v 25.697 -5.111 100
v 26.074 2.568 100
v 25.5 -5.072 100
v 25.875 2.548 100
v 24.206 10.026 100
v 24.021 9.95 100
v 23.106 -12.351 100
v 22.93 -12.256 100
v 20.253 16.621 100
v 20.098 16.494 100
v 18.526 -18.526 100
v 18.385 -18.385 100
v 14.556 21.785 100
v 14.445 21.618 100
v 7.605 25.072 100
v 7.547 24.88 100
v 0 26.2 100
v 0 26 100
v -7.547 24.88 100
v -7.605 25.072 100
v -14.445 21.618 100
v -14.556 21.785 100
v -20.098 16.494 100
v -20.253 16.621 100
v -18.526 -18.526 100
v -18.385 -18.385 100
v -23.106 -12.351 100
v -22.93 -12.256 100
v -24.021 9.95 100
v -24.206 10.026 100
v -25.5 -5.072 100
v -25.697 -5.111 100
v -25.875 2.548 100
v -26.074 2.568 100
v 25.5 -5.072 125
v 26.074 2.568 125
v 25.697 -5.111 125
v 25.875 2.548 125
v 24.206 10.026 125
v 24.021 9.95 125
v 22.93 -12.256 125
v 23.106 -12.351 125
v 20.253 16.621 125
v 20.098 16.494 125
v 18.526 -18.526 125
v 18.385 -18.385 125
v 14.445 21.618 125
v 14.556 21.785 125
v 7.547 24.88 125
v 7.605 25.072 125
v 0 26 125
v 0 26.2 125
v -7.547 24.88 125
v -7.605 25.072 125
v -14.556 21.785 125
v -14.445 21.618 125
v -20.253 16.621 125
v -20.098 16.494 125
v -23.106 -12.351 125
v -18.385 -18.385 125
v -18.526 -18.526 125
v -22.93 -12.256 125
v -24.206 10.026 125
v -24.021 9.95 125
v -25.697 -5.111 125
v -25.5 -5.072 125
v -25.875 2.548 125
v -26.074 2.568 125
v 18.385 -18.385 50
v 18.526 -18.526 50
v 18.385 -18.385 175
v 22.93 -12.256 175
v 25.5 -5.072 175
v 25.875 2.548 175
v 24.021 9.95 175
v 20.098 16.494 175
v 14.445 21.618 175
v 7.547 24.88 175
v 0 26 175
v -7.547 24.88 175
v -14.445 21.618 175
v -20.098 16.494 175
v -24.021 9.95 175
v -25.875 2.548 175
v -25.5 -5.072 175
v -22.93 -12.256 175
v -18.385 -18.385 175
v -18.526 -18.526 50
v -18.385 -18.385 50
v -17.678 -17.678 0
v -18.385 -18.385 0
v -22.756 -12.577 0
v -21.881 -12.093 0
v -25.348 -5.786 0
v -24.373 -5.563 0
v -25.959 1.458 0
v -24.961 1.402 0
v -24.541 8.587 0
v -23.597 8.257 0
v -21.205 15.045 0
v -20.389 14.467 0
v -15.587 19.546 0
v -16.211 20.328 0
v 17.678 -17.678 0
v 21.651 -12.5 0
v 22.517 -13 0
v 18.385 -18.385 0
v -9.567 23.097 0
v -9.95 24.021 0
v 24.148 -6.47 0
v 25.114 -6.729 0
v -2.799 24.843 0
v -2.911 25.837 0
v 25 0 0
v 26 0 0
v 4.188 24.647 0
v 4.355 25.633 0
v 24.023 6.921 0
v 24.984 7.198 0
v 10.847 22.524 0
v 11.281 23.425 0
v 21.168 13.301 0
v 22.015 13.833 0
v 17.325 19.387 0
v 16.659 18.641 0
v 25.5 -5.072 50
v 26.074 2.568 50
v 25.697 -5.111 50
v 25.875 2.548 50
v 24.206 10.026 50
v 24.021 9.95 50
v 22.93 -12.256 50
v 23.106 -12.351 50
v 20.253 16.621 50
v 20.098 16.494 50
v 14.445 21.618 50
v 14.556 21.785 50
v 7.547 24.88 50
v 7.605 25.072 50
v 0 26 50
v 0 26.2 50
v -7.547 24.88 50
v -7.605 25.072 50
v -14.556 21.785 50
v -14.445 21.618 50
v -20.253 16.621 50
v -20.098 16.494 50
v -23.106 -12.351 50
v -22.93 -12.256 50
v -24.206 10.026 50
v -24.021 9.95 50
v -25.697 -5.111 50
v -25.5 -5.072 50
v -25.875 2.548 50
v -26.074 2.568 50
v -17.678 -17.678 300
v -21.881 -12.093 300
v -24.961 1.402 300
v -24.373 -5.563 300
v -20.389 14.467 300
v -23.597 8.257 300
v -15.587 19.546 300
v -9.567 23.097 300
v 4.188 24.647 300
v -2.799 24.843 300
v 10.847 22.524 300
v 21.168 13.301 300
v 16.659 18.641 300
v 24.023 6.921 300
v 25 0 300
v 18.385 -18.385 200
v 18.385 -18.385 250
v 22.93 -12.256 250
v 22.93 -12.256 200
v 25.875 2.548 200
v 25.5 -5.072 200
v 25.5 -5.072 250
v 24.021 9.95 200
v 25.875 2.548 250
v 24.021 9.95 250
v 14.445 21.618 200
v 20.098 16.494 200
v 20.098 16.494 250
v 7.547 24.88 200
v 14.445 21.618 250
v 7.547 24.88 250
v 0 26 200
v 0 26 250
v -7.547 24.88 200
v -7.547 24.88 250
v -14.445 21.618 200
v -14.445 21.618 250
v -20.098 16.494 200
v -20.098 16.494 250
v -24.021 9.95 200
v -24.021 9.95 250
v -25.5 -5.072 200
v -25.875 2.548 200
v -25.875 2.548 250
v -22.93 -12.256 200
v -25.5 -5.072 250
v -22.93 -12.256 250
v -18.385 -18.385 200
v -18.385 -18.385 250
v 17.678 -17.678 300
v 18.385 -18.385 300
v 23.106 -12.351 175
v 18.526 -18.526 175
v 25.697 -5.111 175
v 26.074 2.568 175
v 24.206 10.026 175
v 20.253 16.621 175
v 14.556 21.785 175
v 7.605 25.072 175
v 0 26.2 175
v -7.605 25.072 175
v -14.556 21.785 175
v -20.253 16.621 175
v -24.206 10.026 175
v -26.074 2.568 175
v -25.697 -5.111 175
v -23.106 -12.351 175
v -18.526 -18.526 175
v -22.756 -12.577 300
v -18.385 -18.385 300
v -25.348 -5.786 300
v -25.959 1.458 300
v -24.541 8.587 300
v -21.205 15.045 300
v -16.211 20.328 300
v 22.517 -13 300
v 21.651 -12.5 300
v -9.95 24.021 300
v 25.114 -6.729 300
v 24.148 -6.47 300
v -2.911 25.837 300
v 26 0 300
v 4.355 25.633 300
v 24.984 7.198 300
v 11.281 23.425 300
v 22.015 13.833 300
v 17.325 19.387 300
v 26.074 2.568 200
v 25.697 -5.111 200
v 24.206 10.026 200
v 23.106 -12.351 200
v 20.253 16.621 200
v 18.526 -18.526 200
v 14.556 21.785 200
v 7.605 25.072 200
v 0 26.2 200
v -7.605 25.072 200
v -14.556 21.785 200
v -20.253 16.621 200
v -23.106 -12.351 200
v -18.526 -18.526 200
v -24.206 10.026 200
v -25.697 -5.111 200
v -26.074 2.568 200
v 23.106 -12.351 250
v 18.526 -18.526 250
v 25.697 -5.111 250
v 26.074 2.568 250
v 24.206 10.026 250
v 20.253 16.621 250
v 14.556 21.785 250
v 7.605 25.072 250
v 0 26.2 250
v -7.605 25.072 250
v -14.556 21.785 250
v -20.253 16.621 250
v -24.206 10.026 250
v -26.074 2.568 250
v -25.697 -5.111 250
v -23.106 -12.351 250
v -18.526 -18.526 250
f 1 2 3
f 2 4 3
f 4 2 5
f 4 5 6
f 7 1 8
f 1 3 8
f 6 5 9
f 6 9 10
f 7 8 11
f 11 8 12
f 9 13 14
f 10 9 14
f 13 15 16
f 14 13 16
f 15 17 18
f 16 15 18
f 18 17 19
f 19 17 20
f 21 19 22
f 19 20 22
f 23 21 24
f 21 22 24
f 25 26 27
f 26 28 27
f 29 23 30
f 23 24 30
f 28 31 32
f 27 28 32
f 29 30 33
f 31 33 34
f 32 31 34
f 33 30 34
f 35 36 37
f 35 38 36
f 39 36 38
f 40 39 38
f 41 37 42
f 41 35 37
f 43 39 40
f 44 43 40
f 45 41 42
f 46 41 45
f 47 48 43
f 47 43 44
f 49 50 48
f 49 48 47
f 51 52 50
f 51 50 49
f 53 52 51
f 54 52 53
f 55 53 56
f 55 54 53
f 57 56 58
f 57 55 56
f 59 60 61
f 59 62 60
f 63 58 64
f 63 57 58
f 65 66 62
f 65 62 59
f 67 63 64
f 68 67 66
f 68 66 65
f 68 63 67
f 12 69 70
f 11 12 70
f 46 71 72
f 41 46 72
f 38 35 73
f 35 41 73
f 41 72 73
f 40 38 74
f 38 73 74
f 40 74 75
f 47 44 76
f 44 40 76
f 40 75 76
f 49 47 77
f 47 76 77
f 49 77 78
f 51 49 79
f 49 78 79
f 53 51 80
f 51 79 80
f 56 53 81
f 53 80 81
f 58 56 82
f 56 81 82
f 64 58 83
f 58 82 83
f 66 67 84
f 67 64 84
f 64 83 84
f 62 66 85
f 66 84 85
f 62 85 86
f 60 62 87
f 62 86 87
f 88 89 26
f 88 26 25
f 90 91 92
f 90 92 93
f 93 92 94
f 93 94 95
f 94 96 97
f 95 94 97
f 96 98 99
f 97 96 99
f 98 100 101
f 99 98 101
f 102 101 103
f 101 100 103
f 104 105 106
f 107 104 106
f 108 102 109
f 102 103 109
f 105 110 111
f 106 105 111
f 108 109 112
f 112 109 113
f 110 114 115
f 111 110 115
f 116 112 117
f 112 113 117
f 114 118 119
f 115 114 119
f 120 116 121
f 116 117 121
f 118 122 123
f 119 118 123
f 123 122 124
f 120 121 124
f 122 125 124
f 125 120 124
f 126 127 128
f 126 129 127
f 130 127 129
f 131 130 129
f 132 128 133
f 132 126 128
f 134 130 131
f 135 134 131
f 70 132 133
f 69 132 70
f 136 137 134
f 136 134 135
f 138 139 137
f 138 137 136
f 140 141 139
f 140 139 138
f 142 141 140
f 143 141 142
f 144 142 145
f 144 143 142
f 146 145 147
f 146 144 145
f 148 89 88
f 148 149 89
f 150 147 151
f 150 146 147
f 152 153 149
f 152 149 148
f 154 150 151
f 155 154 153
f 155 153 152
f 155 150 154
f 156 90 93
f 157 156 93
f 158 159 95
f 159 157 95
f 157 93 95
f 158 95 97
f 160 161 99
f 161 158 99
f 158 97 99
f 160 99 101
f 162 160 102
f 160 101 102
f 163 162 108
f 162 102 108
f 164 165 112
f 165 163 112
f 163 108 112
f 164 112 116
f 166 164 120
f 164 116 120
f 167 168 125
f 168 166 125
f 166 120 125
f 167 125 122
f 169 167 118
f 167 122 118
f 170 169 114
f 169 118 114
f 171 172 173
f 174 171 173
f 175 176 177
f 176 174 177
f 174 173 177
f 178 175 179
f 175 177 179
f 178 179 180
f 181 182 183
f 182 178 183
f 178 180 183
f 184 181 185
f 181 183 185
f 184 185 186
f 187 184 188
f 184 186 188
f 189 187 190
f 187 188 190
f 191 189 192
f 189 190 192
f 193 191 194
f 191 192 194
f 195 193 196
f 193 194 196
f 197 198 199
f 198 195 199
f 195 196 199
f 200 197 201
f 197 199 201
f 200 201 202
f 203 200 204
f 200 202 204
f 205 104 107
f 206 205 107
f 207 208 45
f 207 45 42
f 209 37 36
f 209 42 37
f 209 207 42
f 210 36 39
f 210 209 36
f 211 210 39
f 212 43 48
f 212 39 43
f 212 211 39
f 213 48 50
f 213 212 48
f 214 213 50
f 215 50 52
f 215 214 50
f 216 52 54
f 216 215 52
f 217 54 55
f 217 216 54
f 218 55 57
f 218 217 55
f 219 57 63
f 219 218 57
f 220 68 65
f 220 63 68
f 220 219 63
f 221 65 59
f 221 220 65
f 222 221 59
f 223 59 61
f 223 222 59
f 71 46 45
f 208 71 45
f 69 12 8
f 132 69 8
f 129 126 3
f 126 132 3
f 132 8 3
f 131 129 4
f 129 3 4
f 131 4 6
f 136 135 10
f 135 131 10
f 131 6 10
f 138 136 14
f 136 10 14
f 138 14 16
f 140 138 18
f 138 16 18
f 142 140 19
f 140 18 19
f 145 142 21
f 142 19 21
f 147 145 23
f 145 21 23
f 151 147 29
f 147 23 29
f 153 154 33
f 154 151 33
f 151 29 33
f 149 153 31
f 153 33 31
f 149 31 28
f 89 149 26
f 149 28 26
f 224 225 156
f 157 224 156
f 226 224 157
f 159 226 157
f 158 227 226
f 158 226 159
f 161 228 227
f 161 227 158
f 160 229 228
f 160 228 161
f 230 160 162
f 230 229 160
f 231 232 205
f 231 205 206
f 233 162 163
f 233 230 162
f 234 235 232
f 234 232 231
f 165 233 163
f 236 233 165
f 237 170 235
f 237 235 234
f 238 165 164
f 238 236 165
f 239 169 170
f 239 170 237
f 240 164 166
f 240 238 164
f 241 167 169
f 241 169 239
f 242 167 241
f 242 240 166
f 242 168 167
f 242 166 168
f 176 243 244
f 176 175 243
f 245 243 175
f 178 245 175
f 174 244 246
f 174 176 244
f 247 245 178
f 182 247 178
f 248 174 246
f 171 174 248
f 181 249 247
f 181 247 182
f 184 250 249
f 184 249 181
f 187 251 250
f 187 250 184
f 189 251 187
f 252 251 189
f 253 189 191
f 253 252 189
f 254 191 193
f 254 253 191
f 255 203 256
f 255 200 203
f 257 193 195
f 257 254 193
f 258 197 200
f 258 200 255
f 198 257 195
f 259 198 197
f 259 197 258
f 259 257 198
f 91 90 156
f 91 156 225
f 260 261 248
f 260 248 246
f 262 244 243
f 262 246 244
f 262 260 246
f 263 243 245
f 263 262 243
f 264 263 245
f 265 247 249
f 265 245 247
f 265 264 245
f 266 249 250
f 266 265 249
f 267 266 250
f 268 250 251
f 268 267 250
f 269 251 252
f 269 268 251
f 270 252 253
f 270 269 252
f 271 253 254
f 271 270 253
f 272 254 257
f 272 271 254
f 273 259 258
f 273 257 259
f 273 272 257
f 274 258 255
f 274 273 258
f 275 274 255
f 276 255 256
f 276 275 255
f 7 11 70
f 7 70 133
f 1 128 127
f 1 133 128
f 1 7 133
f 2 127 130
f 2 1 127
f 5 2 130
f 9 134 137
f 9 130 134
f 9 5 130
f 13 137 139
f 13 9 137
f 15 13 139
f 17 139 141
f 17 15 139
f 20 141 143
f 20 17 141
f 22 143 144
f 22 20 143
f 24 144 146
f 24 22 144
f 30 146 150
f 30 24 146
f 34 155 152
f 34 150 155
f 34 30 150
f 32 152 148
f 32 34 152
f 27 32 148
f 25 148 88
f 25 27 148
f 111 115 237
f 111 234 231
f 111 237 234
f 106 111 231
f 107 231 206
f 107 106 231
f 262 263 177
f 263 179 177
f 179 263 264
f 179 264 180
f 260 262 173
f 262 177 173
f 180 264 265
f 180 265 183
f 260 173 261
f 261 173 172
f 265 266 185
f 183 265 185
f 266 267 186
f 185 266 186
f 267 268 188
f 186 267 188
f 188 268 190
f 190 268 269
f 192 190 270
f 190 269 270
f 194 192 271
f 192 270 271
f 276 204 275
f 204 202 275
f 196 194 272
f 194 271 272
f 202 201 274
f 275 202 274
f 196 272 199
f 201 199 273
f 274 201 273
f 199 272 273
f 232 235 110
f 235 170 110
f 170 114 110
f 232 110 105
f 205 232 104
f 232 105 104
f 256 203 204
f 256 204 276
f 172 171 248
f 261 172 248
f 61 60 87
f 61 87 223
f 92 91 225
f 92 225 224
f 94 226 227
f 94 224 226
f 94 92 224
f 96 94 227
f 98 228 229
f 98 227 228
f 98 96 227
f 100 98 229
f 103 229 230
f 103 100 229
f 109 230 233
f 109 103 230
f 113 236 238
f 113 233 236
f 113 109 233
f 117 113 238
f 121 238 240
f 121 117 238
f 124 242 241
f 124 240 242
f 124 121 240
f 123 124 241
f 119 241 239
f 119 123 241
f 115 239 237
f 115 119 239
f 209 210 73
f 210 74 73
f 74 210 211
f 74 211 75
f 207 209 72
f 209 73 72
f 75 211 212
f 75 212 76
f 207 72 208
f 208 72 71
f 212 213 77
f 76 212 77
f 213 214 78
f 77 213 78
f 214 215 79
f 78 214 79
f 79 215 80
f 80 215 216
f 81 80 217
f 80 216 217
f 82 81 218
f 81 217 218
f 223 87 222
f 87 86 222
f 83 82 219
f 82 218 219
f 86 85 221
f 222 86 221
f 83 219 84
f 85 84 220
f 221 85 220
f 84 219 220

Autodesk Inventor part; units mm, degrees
ref_plane "YZ Plane" through (0, 0, 0) normal (1, 0, 0) x (0, 1, 0)
ref_plane "XZ Plane" through (0, 0, 0) normal (0, 1, 0) x (-1, 0, 0)
ref_plane "XY Plane" through (0, 0, 0) normal (0, 0, 1) x (1, 0, 0)
sketch "Base" plane through (0, 0, 0) normal (0, 0, 1) x (1, 0, 0)
  circle A0 centre (0, 0) radius 25
  circle A1 centre (0, 0) radius 26
  line L0 (0, 0) -> (-18.3848, -18.3848)
  line L1 (0, -36.4) -> (0, 36.4) construction
  line L2 (0, 0) -> (18.3848, -18.3848)
  point P0 (17.6777, -17.6777)
  point P1 (18.3848, -18.3848)
  point P2 (-17.6777, -17.6777)
  dimension "d1" = 52
  dimension "d0" = 50
  dimension "d4" = 45
extrude "Corpo" add sketch "Base" along normal blind 300 contours A0 L0 A1 L2 picked at (-19.4545, -16.4764)
sketch "FolhaAluminio" plane through (-17.6777, -17.6777, 300) normal (0.7071068, -0.7071068, 0) x (-0.7071068, -0.7071068, 0)
  line L0 (-51, 300) -> (1, 300) projected
  line L1 (1, 300) -> (1, 250) construction
  line L2 (1, 300) -> (1, 0) projected
  line L3 (1, 250) -> (1.2, 250)
  line L4 (1.2, 250) -> (1.2, 200)
  line L5 (1.2, 200) -> (1, 200)
  line L6 (1, 200) -> (1, 250)
  line L7 (1, 200) -> (1, 175) construction
  line L8 (1, 175) -> (1.2, 175)
  line L9 (1.2, 175) -> (1.2, 125)
  line L10 (1.2, 125) -> (1, 125)
  line L11 (1, 125) -> (1, 175)
  line L12 (1, 125) -> (1, 100) construction
  line L13 (1, 100) -> (1.2, 100)
  line L14 (1.2, 100) -> (1.2, 50)
  line L15 (1.2, 50) -> (1, 50)
  line L16 (1, 50) -> (1, 100)
  line L17 (-25, 360) -> (-25, -60) projected
  point P0 (-25, 300)
  point P1 (1, 200)
  point P2 (1, 125)
  point P3 (1, 50)
  dimension "d5" = 50
  dimension "d6" = 0.2
  dimension "d7" = 50
  dimension "d8" = 25
  dimension "d9" = 0.2
  dimension "d10" = 50
  dimension "d11" = 25
  dimension "d12" = 0.2
  dimension "d13" = 50
revolve "Folhas" add sketch "FolhaAluminio" angle 270 about axis through (0, 0, -10) along (0, 0, -1) separate body
properties part number "Cano"
